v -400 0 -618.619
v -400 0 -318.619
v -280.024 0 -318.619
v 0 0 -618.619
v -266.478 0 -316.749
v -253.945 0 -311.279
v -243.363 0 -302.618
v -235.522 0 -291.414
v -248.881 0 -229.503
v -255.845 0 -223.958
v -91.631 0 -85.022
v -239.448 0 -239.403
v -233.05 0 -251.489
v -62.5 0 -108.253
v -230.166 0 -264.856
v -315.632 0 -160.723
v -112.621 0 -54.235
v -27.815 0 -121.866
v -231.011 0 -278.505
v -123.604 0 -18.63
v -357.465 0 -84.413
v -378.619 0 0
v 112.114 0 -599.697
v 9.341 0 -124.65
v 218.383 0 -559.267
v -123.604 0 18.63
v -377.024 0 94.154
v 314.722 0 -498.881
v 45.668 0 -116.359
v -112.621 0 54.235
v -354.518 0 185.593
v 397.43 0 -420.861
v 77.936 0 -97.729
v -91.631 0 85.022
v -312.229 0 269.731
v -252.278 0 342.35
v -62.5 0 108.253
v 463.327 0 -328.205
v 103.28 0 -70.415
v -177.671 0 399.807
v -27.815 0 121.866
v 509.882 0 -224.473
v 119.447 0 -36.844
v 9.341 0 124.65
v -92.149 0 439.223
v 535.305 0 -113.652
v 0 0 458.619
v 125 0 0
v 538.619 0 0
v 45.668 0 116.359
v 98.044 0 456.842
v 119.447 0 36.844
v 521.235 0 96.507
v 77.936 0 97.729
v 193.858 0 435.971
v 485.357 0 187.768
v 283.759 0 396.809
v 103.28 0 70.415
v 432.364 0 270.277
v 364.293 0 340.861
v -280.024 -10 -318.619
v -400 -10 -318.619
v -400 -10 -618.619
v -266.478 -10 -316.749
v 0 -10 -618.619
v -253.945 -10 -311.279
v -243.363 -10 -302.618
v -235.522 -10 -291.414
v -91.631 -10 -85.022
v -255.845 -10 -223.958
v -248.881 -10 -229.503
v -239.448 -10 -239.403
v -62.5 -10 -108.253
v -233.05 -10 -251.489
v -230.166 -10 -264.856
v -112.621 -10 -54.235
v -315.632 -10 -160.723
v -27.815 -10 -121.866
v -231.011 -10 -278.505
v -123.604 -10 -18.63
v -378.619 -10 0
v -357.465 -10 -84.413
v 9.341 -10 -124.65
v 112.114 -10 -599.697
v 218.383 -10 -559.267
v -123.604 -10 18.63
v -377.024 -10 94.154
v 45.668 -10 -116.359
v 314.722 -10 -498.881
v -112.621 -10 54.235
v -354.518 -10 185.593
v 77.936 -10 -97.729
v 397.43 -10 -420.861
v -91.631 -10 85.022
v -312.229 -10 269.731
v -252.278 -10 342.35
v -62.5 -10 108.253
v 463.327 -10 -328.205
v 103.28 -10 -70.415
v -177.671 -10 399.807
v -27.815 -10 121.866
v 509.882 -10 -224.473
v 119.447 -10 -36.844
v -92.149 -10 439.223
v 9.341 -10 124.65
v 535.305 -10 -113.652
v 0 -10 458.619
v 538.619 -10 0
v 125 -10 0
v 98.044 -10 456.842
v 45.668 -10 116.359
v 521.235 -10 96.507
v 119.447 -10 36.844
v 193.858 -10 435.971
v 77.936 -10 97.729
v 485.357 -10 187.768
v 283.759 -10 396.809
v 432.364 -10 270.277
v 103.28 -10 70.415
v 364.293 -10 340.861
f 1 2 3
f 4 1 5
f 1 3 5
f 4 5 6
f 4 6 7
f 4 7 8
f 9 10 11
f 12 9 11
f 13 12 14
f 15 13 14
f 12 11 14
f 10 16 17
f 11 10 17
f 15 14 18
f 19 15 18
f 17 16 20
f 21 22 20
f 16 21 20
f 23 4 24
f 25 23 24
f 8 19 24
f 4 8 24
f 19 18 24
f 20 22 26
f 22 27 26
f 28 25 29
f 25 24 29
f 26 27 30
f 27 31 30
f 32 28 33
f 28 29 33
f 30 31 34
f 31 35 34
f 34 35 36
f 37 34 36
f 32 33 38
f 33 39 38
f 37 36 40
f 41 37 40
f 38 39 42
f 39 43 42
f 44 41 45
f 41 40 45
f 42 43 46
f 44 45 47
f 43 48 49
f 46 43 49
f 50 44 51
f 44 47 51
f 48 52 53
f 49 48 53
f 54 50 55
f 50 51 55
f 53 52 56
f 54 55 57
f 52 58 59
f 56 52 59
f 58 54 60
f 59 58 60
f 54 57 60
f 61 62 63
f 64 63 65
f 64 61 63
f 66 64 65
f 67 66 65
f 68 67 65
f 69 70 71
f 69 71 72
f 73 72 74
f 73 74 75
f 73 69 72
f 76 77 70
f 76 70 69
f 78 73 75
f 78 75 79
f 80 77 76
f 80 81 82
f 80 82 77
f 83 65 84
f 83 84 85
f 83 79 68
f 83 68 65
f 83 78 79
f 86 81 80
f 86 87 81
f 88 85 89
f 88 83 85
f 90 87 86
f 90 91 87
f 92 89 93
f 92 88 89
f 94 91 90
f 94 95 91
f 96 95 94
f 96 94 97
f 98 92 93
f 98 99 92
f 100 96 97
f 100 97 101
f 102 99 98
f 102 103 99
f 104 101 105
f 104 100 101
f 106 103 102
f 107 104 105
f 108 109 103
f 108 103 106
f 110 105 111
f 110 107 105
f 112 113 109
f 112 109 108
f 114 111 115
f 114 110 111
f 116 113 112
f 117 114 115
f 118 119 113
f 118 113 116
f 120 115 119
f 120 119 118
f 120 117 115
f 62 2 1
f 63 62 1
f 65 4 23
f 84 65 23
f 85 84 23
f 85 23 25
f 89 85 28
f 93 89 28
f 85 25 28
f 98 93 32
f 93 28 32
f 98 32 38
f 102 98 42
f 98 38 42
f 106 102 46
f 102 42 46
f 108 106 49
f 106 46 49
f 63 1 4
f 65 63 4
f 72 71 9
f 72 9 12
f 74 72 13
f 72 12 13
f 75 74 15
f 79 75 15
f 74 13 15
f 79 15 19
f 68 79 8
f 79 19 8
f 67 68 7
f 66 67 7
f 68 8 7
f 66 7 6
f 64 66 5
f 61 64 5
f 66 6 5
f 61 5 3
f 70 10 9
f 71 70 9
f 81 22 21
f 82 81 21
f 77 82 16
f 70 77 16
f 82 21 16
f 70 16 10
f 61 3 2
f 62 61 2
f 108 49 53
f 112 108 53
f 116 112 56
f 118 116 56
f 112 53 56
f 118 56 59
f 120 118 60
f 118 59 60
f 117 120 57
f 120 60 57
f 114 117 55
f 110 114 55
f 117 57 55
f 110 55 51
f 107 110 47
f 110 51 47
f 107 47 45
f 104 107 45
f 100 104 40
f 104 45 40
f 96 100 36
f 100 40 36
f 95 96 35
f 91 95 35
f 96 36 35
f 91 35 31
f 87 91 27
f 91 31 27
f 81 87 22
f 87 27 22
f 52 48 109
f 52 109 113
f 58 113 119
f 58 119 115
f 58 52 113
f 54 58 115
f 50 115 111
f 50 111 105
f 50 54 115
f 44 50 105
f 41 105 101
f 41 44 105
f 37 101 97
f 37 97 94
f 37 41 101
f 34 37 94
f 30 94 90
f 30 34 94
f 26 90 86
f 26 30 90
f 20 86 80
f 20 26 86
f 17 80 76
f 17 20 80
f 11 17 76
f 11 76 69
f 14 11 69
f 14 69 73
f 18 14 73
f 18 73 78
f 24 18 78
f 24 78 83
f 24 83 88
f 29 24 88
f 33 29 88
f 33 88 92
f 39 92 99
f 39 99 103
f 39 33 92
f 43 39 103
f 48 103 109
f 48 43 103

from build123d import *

# Parameters (mm, degrees)
F0_R     = 125
F1_DEPTH = 10


# Not quite as in the source:
# - a feature names something its author has since deleted; it is built from what else it names


with BuildPart() as f1:
    # F0 (on Front) → F1 (new body)
    with BuildSketch(Plane.XZ):
        with BuildLine():
            ThreePointArc((0, -618.6190456596), (397.429722157, -420.8611796621), (538.6190456596, 0))
            ThreePointArc((538.6190456596, 0), (364.2926371672, 340.8611796621), (0, 458.6190456596))
            ThreePointArc((0, 458.6190456596), (-284.2926371672, 307.7240946723), (-378.6190456596, 0))
            ThreePointArc((-378.6190456596, 0), (-338.9932719851, -123.9081492515), (-255.845498181, -223.9575325662))
            Line((-255.845498181, -223.9575325662), (-248.8807463186, -229.5026751274))
            ThreePointArc((-248.8807463186, -229.5026751274), (-232.823383589, -285.1142187928), (-280.0241173048, -318.6190456596))
            Line((-280.0241173048, -318.6190456596), (-400, -318.6190456596))
            Line((-400, -318.6190456596), (-400, -618.6190456596))
            Line((-400, -618.6190456596), (0, -618.6190456596))
        make_face()
        Circle(F0_R, mode=Mode.SUBTRACT)
    extrude(amount=F1_DEPTH)


solid = f1.part
